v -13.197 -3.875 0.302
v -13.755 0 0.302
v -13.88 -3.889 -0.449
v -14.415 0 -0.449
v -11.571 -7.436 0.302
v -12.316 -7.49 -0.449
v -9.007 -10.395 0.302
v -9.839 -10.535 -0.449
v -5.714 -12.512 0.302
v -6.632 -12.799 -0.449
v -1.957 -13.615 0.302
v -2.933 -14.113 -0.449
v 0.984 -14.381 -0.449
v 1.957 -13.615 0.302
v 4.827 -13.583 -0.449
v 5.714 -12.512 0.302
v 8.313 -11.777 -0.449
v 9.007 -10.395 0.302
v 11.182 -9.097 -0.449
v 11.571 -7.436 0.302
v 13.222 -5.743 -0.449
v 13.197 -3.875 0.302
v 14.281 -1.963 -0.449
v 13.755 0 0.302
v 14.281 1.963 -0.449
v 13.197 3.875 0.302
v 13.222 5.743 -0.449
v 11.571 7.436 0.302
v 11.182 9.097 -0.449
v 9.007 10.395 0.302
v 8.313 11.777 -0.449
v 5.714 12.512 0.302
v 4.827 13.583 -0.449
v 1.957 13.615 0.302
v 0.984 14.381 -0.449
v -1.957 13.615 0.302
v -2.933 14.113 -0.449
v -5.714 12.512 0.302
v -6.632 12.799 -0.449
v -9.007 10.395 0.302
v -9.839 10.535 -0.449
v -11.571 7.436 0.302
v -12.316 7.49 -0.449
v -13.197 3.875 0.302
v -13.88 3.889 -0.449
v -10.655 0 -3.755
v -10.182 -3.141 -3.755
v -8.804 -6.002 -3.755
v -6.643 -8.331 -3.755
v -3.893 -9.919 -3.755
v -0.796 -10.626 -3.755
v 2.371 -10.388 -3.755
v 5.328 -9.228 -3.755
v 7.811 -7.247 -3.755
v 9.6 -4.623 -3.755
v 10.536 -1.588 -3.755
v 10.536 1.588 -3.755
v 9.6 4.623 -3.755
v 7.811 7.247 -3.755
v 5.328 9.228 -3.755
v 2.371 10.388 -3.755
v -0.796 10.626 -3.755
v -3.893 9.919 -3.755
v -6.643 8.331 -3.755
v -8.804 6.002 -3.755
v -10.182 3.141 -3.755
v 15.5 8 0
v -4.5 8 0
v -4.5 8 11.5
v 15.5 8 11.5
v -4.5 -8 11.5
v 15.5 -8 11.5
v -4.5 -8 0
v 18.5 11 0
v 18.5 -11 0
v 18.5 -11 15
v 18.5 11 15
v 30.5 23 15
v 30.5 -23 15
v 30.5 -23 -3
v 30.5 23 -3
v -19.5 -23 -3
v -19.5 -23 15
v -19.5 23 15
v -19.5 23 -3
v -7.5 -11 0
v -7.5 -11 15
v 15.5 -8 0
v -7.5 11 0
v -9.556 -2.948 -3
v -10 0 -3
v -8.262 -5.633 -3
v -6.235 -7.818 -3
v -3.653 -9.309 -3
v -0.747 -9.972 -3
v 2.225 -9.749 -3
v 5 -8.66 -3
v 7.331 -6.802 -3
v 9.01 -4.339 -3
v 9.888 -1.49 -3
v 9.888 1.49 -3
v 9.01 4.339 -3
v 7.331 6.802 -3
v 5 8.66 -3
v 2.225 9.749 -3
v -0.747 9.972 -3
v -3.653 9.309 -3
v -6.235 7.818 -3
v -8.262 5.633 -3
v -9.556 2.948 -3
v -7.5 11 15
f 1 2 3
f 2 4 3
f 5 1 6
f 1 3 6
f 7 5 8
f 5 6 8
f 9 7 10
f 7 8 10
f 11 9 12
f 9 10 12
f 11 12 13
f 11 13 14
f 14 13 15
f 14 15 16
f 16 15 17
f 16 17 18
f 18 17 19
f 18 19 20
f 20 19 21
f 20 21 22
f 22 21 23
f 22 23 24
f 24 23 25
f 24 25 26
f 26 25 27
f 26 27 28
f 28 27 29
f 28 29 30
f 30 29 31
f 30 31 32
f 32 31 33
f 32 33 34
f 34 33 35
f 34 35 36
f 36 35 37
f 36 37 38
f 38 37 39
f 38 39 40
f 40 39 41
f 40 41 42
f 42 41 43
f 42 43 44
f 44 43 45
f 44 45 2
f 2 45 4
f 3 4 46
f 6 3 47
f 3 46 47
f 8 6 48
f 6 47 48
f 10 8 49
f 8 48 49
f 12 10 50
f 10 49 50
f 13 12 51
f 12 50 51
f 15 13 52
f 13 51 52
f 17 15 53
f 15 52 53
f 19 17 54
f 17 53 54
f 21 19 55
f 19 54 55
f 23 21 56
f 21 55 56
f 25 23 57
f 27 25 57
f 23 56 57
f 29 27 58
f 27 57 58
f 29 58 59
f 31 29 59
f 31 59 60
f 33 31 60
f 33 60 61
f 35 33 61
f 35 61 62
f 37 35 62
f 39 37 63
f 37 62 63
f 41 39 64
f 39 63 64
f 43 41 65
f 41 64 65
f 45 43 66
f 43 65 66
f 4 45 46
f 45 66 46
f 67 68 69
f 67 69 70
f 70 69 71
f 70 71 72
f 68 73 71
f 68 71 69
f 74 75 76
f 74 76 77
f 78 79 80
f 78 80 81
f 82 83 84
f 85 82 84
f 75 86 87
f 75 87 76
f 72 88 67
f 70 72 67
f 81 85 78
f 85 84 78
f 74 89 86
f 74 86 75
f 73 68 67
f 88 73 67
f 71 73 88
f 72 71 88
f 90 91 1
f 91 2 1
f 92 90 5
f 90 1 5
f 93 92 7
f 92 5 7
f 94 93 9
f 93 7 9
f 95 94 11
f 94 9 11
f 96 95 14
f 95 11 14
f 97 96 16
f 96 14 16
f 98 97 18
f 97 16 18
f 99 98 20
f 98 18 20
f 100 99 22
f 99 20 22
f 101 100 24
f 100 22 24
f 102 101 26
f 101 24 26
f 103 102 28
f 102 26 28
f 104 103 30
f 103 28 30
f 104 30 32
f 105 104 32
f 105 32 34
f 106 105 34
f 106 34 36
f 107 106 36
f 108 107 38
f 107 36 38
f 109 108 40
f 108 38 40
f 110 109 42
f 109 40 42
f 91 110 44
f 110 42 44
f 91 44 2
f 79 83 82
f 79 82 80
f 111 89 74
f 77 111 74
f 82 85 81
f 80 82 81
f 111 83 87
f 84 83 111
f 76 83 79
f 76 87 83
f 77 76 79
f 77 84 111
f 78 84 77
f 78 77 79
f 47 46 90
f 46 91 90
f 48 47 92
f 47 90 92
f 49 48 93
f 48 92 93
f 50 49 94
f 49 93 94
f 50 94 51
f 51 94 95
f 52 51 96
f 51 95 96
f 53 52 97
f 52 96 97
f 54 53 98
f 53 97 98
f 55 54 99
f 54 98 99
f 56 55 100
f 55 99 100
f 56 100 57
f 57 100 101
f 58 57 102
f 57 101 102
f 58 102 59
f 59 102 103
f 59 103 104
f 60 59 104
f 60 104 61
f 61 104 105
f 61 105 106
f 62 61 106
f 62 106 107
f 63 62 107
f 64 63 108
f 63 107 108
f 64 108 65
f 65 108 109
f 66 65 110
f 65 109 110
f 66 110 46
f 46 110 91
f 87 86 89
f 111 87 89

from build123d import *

# Parameters (mm, degrees)
F2_W          = 20
F2_H          = 16
F3_DEPTH      = 11.5
F4_W          = 50
F4_H          = 46
F4_W_2        = 26
F4_H_2        = 22
F5_DEPTH      = 15
F5_DEPTH_BACK = 3
F6_DEPTH      = 25


with BuildPart() as f1:
    # F0 (on Front) → F1 (revolve)
    with BuildSketch(Plane.XZ):
        Polygon((-10.6553274116, -3.7553449435), (-10, -3), (-13.7545470851, 0.3020260729), (-14.4149372893, -0.4488662767), align=None)
    revolve(axis=Axis((0, 0, 14.246087247), (0, 0, 1)))


with BuildPart() as f3:
    # F2 (on Top) → F3 (new body)
    with BuildSketch(Plane.XY):
        with Locations((5.5, 0)):
            Rectangle(F2_W, F2_H)
    extrude(amount=F3_DEPTH)


with BuildPart() as f5:
    # F4 (on Top) → F5 (new body, two sides)
    with BuildSketch(Plane.XY) as f5_sk:
        with Locations((5.5, 0)):
            Rectangle(F4_W, F4_H)
        with Locations((5.5, 0)):
            Rectangle(F4_W_2, F4_H_2, mode=Mode.SUBTRACT)
        with Locations((5.5, 0)):
            Rectangle(F4_W_2, F4_H_2)
    extrude(amount=F5_DEPTH)
    extrude(f5_sk.sketch, amount=-F5_DEPTH_BACK)

    # F4 (on Top) → F6 (cut)
    with BuildSketch(Plane.XY):
        with Locations((5.5, 0)):
            Rectangle(F4_W_2, F4_H_2)
    extrude(amount=F6_DEPTH, mode=Mode.SUBTRACT)


solid = Compound([f1.part, f3.part, f5.part])
